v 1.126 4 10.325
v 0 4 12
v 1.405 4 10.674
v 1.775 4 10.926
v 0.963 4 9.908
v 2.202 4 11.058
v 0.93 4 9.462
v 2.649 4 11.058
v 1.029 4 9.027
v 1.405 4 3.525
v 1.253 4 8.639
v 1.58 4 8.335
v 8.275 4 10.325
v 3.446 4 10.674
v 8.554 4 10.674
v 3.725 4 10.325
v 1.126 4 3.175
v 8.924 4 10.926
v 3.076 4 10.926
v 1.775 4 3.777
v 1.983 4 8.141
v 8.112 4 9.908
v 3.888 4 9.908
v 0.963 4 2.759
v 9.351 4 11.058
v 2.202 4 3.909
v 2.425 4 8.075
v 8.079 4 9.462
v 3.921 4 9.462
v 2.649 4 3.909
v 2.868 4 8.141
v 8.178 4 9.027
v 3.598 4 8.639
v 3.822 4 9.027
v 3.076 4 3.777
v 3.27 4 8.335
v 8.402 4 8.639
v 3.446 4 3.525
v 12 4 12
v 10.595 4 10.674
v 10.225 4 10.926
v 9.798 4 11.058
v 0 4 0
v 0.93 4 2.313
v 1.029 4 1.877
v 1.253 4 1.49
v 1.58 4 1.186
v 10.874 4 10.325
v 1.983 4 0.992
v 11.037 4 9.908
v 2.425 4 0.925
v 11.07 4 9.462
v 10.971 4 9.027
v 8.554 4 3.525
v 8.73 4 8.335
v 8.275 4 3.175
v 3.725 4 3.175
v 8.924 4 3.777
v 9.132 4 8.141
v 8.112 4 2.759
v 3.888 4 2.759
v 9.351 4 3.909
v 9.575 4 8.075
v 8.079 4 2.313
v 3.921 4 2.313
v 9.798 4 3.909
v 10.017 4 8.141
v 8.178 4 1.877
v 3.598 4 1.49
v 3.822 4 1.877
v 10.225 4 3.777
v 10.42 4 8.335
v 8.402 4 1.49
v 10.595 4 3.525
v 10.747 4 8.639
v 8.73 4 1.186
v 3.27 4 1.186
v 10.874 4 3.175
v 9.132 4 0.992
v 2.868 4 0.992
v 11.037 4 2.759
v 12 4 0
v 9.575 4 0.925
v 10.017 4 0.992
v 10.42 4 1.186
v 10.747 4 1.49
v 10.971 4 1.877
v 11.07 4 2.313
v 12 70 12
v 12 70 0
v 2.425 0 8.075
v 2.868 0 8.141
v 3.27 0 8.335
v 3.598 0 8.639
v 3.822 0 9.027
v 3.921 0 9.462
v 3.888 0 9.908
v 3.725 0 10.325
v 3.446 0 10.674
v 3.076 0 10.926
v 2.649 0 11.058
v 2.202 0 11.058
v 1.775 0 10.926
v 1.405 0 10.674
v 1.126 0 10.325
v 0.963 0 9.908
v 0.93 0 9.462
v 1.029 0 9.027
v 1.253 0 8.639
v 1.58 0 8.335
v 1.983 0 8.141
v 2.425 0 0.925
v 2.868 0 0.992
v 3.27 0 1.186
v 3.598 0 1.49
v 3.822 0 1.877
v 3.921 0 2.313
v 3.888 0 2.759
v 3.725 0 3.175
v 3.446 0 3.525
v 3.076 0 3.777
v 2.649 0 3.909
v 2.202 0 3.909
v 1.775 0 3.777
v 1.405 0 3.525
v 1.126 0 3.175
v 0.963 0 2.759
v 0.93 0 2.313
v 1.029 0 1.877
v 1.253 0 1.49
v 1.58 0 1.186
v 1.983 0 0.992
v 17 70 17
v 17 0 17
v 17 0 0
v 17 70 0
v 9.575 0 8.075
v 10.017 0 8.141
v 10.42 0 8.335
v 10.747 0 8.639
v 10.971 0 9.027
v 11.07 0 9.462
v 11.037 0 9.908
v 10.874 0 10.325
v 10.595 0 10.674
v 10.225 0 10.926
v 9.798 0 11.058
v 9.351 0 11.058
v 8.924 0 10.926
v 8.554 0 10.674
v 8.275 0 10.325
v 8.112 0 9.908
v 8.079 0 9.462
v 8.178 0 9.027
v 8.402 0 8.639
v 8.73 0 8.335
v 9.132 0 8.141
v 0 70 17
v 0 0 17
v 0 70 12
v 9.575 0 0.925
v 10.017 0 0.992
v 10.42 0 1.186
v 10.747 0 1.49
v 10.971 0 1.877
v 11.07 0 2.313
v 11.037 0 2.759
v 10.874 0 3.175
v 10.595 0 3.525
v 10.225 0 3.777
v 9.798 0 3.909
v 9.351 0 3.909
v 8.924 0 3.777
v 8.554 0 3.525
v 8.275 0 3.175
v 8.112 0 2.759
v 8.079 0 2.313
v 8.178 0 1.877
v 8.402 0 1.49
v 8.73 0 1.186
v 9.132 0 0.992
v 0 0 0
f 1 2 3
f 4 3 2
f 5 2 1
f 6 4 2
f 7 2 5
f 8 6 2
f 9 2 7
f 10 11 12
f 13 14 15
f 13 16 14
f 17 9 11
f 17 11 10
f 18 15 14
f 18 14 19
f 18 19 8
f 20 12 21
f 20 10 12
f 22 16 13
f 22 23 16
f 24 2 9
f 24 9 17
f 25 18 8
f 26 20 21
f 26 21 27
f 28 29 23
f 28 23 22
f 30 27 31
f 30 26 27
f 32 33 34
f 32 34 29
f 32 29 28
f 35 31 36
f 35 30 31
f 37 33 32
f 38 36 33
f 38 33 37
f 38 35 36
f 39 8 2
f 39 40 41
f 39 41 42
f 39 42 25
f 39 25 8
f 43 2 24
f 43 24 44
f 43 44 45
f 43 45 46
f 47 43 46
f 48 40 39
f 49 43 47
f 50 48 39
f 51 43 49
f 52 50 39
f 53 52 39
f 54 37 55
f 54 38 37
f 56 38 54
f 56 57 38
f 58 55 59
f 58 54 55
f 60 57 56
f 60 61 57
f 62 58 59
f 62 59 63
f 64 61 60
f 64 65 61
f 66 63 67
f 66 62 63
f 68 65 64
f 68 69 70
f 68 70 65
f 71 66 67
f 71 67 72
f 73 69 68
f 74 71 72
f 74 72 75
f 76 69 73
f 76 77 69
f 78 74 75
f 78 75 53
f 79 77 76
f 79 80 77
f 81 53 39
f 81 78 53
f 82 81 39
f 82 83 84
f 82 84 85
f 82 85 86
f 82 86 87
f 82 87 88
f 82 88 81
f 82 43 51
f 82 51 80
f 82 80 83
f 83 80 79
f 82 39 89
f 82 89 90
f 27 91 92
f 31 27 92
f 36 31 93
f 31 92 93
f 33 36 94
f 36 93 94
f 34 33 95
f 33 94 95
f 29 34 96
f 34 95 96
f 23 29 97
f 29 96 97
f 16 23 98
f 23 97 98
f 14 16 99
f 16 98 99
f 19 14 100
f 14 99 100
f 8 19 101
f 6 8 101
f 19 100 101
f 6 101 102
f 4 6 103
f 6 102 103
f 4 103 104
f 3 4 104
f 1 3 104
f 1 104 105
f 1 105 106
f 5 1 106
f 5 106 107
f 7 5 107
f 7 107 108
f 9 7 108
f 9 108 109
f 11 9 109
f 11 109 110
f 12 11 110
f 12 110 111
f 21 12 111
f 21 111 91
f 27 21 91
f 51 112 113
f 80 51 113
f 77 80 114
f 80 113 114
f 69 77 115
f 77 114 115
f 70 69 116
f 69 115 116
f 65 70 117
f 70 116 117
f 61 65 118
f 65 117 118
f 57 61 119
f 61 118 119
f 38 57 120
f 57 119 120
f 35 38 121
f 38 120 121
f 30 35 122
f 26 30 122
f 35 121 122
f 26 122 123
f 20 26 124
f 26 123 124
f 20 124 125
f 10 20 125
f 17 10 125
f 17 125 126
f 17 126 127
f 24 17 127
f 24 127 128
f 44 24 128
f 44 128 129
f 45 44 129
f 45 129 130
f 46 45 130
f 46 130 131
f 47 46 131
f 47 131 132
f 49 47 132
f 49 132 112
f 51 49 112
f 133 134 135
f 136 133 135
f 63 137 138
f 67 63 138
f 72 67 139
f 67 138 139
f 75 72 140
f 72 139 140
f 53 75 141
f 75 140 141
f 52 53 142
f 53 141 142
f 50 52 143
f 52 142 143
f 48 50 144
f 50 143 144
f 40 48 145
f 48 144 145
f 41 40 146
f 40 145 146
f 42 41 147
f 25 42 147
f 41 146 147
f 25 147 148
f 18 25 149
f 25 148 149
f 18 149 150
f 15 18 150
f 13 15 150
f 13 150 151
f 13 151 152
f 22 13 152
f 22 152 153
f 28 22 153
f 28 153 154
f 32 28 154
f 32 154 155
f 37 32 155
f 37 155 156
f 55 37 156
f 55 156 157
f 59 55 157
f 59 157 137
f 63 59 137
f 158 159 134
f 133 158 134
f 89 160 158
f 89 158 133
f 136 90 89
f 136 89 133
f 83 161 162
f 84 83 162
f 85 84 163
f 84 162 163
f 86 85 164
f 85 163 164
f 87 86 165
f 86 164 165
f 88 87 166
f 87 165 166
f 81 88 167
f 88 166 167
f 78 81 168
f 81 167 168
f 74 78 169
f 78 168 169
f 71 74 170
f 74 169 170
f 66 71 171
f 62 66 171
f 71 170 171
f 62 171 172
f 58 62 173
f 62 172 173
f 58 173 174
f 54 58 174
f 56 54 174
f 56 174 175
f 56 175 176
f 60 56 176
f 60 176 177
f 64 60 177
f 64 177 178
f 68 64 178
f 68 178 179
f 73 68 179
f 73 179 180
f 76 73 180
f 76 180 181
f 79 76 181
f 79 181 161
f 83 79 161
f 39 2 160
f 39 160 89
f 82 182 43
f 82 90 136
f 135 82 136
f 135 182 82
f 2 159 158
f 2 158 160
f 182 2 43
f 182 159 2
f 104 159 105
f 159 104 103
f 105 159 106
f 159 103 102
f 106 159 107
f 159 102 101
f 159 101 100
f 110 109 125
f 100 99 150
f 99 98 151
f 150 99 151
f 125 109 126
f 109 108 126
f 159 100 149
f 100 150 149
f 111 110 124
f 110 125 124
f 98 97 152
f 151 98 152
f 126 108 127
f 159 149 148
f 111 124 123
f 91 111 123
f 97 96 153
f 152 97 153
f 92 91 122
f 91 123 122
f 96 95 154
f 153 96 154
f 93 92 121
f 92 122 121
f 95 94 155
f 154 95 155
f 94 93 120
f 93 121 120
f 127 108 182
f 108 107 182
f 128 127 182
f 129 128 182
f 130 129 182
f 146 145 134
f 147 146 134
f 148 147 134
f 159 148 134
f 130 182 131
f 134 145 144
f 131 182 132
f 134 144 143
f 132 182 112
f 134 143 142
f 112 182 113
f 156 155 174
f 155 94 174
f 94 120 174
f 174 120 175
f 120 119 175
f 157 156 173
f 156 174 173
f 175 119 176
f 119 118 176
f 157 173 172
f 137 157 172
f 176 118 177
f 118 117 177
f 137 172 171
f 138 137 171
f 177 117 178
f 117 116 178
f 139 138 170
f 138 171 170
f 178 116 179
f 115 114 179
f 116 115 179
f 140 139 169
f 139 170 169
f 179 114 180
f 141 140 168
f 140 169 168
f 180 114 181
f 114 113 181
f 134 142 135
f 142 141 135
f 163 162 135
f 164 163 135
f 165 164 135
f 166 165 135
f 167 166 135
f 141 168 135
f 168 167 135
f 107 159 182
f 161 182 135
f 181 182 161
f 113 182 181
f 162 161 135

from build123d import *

# Parameters (mm, degrees)
SKETCH_1_W          = 17
SKETCH_1_H          = 17
EXTRUDE_1_DEPTH     = 70
SKETCH_2_W          = 12
SKETCH_2_H          = 12
CUT_EXTRUDE_1_DEPTH = 66
SKETCH_3_R          = 1.5
CUT_EXTRUDE_2_DEPTH = 8


with BuildPart() as part:
    # 草图1 → 凸台-拉伸1 (new body)
    with BuildSketch(Plane(origin=(0, 0, 0), x_dir=(1, 0, 0), z_dir=(0, 1, 0))):
        with Locations((8.5, -8.5)):
            Rectangle(SKETCH_1_W, SKETCH_1_H)
    extrude(amount=EXTRUDE_1_DEPTH)

    # 草图2 → 切除-拉伸1 (cut)
    with BuildSketch(Plane(origin=(0, 70, 0), x_dir=(1, 0, 0), z_dir=(0, 1, 0))):
        with Locations((6, -6)):
            Rectangle(SKETCH_2_W, SKETCH_2_H)
    extrude(amount=-CUT_EXTRUDE_1_DEPTH, mode=Mode.SUBTRACT)

    # 草图3 → 切除-拉伸2 (cut)
    with BuildSketch(Plane(origin=(0, 0, 0), x_dir=(-1, 0, 0), z_dir=(0, -1, 0))):
        with Locations(Location((-9.574531369, -2.425468631, 0), (0, 0, 90))):
            Circle(SKETCH_3_R)
        with Locations(Location((-2.425468631, -2.425468631, 0), (0, 0, 90))):
            Circle(SKETCH_3_R)
        with Locations(Location((-9.574531369, -9.574531369, 0), (0, 0, 90))):
            Circle(SKETCH_3_R)
        with Locations(Location((-2.425468631, -9.574531369, 0), (0, 0, 90))):
            Circle(SKETCH_3_R)
    extrude(amount=-CUT_EXTRUDE_2_DEPTH, mode=Mode.SUBTRACT)


solid = part.part
